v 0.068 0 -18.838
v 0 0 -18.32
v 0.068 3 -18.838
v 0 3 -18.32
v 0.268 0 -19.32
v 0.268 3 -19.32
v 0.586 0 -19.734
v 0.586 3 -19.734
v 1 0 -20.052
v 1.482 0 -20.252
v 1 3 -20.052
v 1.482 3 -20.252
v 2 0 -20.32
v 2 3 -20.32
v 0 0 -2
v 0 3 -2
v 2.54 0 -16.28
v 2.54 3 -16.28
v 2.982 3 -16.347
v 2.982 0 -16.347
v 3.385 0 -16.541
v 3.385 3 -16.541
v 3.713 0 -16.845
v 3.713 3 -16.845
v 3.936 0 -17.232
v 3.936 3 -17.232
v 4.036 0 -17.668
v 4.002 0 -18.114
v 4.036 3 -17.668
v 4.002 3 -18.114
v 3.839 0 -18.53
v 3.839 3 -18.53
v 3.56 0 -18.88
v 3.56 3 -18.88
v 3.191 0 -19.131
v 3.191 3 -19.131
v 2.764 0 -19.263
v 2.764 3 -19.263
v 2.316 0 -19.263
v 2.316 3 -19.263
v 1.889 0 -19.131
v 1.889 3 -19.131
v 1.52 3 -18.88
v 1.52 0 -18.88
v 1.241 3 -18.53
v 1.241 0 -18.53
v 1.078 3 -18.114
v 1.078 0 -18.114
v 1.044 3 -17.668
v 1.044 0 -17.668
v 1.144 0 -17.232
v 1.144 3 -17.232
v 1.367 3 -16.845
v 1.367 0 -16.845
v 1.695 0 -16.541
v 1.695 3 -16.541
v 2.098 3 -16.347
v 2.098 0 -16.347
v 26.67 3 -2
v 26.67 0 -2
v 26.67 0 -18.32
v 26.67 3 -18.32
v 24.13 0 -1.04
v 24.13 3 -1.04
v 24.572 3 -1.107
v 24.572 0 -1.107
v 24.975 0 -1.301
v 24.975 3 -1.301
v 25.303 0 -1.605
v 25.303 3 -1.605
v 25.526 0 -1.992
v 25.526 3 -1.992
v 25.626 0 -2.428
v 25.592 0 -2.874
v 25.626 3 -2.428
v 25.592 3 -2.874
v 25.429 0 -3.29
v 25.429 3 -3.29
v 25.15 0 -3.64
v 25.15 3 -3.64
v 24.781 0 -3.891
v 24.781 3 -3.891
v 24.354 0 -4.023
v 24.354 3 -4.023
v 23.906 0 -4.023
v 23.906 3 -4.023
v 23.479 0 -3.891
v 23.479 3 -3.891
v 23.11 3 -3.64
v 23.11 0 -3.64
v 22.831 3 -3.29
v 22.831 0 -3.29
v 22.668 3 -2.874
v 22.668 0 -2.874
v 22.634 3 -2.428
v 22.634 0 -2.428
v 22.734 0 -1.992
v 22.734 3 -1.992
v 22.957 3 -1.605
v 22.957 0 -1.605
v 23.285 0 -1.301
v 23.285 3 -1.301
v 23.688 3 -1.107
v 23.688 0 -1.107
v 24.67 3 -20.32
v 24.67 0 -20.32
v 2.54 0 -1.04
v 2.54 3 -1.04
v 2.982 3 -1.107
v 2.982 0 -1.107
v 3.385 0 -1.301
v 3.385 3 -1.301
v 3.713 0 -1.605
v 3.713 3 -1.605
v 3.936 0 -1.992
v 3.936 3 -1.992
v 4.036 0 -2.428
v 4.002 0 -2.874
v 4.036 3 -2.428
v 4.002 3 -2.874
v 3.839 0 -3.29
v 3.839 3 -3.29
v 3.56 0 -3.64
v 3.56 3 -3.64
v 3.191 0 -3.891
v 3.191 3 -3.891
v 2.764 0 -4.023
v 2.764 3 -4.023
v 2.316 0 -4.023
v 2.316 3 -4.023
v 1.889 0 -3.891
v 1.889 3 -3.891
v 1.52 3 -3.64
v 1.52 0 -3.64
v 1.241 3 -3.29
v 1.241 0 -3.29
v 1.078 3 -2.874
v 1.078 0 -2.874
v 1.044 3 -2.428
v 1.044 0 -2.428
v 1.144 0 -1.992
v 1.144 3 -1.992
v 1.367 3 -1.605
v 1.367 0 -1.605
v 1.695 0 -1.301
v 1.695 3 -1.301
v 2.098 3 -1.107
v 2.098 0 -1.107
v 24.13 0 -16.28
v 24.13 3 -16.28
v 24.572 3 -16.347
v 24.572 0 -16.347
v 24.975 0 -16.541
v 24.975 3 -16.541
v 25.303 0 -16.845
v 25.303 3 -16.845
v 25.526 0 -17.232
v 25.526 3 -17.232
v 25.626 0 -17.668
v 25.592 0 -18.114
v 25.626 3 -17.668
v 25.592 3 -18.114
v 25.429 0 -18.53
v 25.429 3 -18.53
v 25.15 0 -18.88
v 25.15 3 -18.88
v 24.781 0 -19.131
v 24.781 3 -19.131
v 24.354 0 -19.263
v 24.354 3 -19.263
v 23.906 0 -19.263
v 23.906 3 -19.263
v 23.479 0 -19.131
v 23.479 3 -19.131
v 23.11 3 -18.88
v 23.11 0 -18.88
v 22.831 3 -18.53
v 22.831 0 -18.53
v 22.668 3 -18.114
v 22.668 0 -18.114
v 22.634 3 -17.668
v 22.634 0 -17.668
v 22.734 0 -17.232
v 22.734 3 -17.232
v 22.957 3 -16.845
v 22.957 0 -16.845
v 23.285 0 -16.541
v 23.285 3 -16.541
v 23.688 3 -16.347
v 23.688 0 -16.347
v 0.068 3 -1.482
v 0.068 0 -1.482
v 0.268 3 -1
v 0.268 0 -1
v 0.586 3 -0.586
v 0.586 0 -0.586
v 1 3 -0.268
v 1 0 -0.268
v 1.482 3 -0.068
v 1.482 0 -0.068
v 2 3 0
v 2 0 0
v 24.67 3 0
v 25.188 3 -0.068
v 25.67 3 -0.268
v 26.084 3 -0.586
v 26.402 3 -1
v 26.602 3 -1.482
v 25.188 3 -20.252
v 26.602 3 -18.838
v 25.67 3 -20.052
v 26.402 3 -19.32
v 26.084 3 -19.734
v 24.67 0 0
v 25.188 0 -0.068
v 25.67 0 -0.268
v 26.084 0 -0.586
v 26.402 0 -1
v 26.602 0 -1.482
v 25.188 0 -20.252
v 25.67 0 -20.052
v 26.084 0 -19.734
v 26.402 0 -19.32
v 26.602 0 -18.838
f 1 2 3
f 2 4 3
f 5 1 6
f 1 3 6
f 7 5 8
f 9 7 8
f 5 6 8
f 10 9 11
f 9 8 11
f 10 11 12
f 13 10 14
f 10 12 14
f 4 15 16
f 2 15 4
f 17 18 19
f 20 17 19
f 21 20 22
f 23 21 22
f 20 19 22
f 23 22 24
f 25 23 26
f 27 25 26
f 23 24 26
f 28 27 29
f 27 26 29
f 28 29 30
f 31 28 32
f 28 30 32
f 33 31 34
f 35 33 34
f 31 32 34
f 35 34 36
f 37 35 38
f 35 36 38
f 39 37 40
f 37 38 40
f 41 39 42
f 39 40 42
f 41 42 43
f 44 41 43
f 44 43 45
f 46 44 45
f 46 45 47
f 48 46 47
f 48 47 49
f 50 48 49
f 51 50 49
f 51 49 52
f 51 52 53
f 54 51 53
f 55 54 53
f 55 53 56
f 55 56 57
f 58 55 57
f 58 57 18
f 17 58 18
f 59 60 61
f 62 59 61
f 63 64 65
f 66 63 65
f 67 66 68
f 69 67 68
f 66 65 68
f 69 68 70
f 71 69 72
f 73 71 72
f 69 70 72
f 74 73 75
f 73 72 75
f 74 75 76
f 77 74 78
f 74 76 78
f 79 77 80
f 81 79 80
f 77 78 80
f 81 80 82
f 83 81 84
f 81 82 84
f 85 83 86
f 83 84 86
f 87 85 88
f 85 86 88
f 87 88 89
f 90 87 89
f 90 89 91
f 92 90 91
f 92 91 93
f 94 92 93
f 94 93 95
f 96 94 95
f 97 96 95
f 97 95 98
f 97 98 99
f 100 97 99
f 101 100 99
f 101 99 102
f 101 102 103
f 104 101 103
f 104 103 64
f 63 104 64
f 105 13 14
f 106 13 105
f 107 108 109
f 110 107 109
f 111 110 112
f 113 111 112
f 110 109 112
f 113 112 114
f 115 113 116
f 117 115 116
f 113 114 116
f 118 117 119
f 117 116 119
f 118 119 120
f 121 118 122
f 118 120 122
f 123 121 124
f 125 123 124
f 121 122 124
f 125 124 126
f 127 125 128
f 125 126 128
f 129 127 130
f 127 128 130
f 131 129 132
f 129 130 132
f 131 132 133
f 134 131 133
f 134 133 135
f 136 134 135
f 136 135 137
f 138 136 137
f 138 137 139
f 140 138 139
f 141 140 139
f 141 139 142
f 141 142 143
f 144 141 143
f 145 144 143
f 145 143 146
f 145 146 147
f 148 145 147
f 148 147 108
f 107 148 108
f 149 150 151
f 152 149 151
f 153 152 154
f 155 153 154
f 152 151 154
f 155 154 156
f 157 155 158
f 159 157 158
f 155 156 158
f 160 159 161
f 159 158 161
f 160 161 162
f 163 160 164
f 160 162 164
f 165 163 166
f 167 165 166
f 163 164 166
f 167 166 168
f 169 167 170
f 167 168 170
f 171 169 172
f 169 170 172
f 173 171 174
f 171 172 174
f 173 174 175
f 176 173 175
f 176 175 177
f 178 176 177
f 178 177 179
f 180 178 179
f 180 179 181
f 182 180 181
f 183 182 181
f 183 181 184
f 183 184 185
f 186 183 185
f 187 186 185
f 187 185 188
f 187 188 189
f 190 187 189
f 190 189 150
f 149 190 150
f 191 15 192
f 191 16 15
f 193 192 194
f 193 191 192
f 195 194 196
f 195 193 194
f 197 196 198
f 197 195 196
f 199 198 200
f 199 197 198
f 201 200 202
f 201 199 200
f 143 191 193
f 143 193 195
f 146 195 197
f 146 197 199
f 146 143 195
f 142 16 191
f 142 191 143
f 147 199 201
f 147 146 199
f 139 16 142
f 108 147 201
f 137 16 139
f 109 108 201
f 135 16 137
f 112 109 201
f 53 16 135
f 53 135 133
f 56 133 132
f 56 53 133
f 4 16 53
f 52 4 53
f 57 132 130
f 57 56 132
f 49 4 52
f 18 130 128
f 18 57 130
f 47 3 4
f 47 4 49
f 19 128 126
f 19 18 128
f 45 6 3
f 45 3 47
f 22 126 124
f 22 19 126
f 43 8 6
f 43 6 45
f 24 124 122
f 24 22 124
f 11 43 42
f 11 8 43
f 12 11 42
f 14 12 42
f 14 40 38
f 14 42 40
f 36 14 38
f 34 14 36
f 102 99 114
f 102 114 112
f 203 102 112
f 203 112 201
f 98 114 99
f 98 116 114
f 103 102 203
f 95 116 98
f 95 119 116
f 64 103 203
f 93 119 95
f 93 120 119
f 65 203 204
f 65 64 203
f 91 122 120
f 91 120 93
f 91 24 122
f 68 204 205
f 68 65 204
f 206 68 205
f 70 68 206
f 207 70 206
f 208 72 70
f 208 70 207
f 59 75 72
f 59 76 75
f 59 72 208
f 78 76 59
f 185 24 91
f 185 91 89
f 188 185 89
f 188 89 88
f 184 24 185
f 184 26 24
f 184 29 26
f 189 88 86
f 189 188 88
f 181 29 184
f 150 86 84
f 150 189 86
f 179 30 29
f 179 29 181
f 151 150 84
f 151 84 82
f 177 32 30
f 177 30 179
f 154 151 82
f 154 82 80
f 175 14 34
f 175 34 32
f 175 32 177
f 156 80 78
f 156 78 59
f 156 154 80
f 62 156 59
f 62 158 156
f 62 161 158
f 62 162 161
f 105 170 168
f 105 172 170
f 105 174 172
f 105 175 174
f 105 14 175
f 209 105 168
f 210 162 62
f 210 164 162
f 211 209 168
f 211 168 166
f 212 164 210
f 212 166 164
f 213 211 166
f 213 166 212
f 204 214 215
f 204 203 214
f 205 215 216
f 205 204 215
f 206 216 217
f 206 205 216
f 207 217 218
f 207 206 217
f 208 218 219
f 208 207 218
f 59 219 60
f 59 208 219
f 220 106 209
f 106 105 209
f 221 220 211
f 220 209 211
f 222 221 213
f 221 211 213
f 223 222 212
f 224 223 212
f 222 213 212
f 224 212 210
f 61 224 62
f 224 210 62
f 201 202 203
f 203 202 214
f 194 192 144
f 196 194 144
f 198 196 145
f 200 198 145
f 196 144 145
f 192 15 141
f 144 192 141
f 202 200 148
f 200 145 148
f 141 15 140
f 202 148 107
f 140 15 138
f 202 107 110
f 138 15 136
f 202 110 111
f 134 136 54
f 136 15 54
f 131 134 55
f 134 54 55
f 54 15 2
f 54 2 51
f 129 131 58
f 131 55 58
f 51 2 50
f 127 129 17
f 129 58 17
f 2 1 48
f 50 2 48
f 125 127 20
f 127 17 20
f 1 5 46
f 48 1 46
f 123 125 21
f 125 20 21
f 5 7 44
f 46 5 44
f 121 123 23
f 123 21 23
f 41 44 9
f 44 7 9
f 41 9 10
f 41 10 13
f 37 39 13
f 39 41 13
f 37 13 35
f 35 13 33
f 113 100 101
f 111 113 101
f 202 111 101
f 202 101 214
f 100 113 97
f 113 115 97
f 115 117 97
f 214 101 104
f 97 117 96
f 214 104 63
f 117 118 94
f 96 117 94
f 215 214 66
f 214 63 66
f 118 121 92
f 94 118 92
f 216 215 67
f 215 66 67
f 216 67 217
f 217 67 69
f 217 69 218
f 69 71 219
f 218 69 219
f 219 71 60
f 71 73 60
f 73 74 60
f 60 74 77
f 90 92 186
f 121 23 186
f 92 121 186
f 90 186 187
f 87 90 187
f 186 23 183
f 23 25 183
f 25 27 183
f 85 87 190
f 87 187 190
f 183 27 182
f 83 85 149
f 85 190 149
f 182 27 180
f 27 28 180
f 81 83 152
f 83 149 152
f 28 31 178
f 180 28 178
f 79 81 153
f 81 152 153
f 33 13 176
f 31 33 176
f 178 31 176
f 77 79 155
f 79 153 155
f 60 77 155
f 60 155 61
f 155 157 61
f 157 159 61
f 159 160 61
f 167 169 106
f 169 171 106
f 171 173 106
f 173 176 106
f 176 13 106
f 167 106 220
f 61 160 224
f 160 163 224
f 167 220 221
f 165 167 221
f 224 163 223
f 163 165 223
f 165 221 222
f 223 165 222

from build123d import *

# Parameters (mm, degrees)
CROQUIS1_W              = 26.67
CROQUIS1_H              = 20.32
SALIENTE_EXTRUIR1_DEPTH = 3
CROQUIS2_R              = 1.5
CORTAR_EXTRUIR1_DEPTH   = 34.662906886
REDONDEO1_R             = 2


with BuildPart() as part:
    # Croquis1 → Saliente-Extruir1 (new body)
    with BuildSketch(Plane(origin=(0, 0, 0), x_dir=(1, 0, 0), z_dir=(0, 1, 0))):
        with Locations((13.335, 10.16)):
            Rectangle(CROQUIS1_W, CROQUIS1_H)
    extrude(amount=SALIENTE_EXTRUIR1_DEPTH)

    # Croquis2 → Cortar-Extruir1 (cut, through all)
    with BuildSketch(Plane(origin=(0, 3, 0), x_dir=(1, 0, 0), z_dir=(0, 1, 0))):
        with Locations(Location((24.13, 2.54, 0), (0, 0, 270))):
            Circle(CROQUIS2_R)
        with Locations(Location((2.54, 2.54, 0), (0, 0, 270))):
            Circle(CROQUIS2_R)
        with Locations(Location((2.54, 17.78, 0), (0, 0, 270))):
            Circle(CROQUIS2_R)
        with Locations(Location((24.13, 17.78, 0), (0, 0, 270))):
            Circle(CROQUIS2_R)
    extrude(amount=-CORTAR_EXTRUIR1_DEPTH, mode=Mode.SUBTRACT)

    # Redondeo1
    redondeo1_edges = [part.edges().sort_by_distance(p)[0] for p in [
        (0, 1.5, -20.32),
        (0, 1.5, 0),
        (26.67, 1.5, 0),
        (26.67, 1.5, -20.32),
    ]]
    fillet(redondeo1_edges, radius=REDONDEO1_R)


solid = part.part
